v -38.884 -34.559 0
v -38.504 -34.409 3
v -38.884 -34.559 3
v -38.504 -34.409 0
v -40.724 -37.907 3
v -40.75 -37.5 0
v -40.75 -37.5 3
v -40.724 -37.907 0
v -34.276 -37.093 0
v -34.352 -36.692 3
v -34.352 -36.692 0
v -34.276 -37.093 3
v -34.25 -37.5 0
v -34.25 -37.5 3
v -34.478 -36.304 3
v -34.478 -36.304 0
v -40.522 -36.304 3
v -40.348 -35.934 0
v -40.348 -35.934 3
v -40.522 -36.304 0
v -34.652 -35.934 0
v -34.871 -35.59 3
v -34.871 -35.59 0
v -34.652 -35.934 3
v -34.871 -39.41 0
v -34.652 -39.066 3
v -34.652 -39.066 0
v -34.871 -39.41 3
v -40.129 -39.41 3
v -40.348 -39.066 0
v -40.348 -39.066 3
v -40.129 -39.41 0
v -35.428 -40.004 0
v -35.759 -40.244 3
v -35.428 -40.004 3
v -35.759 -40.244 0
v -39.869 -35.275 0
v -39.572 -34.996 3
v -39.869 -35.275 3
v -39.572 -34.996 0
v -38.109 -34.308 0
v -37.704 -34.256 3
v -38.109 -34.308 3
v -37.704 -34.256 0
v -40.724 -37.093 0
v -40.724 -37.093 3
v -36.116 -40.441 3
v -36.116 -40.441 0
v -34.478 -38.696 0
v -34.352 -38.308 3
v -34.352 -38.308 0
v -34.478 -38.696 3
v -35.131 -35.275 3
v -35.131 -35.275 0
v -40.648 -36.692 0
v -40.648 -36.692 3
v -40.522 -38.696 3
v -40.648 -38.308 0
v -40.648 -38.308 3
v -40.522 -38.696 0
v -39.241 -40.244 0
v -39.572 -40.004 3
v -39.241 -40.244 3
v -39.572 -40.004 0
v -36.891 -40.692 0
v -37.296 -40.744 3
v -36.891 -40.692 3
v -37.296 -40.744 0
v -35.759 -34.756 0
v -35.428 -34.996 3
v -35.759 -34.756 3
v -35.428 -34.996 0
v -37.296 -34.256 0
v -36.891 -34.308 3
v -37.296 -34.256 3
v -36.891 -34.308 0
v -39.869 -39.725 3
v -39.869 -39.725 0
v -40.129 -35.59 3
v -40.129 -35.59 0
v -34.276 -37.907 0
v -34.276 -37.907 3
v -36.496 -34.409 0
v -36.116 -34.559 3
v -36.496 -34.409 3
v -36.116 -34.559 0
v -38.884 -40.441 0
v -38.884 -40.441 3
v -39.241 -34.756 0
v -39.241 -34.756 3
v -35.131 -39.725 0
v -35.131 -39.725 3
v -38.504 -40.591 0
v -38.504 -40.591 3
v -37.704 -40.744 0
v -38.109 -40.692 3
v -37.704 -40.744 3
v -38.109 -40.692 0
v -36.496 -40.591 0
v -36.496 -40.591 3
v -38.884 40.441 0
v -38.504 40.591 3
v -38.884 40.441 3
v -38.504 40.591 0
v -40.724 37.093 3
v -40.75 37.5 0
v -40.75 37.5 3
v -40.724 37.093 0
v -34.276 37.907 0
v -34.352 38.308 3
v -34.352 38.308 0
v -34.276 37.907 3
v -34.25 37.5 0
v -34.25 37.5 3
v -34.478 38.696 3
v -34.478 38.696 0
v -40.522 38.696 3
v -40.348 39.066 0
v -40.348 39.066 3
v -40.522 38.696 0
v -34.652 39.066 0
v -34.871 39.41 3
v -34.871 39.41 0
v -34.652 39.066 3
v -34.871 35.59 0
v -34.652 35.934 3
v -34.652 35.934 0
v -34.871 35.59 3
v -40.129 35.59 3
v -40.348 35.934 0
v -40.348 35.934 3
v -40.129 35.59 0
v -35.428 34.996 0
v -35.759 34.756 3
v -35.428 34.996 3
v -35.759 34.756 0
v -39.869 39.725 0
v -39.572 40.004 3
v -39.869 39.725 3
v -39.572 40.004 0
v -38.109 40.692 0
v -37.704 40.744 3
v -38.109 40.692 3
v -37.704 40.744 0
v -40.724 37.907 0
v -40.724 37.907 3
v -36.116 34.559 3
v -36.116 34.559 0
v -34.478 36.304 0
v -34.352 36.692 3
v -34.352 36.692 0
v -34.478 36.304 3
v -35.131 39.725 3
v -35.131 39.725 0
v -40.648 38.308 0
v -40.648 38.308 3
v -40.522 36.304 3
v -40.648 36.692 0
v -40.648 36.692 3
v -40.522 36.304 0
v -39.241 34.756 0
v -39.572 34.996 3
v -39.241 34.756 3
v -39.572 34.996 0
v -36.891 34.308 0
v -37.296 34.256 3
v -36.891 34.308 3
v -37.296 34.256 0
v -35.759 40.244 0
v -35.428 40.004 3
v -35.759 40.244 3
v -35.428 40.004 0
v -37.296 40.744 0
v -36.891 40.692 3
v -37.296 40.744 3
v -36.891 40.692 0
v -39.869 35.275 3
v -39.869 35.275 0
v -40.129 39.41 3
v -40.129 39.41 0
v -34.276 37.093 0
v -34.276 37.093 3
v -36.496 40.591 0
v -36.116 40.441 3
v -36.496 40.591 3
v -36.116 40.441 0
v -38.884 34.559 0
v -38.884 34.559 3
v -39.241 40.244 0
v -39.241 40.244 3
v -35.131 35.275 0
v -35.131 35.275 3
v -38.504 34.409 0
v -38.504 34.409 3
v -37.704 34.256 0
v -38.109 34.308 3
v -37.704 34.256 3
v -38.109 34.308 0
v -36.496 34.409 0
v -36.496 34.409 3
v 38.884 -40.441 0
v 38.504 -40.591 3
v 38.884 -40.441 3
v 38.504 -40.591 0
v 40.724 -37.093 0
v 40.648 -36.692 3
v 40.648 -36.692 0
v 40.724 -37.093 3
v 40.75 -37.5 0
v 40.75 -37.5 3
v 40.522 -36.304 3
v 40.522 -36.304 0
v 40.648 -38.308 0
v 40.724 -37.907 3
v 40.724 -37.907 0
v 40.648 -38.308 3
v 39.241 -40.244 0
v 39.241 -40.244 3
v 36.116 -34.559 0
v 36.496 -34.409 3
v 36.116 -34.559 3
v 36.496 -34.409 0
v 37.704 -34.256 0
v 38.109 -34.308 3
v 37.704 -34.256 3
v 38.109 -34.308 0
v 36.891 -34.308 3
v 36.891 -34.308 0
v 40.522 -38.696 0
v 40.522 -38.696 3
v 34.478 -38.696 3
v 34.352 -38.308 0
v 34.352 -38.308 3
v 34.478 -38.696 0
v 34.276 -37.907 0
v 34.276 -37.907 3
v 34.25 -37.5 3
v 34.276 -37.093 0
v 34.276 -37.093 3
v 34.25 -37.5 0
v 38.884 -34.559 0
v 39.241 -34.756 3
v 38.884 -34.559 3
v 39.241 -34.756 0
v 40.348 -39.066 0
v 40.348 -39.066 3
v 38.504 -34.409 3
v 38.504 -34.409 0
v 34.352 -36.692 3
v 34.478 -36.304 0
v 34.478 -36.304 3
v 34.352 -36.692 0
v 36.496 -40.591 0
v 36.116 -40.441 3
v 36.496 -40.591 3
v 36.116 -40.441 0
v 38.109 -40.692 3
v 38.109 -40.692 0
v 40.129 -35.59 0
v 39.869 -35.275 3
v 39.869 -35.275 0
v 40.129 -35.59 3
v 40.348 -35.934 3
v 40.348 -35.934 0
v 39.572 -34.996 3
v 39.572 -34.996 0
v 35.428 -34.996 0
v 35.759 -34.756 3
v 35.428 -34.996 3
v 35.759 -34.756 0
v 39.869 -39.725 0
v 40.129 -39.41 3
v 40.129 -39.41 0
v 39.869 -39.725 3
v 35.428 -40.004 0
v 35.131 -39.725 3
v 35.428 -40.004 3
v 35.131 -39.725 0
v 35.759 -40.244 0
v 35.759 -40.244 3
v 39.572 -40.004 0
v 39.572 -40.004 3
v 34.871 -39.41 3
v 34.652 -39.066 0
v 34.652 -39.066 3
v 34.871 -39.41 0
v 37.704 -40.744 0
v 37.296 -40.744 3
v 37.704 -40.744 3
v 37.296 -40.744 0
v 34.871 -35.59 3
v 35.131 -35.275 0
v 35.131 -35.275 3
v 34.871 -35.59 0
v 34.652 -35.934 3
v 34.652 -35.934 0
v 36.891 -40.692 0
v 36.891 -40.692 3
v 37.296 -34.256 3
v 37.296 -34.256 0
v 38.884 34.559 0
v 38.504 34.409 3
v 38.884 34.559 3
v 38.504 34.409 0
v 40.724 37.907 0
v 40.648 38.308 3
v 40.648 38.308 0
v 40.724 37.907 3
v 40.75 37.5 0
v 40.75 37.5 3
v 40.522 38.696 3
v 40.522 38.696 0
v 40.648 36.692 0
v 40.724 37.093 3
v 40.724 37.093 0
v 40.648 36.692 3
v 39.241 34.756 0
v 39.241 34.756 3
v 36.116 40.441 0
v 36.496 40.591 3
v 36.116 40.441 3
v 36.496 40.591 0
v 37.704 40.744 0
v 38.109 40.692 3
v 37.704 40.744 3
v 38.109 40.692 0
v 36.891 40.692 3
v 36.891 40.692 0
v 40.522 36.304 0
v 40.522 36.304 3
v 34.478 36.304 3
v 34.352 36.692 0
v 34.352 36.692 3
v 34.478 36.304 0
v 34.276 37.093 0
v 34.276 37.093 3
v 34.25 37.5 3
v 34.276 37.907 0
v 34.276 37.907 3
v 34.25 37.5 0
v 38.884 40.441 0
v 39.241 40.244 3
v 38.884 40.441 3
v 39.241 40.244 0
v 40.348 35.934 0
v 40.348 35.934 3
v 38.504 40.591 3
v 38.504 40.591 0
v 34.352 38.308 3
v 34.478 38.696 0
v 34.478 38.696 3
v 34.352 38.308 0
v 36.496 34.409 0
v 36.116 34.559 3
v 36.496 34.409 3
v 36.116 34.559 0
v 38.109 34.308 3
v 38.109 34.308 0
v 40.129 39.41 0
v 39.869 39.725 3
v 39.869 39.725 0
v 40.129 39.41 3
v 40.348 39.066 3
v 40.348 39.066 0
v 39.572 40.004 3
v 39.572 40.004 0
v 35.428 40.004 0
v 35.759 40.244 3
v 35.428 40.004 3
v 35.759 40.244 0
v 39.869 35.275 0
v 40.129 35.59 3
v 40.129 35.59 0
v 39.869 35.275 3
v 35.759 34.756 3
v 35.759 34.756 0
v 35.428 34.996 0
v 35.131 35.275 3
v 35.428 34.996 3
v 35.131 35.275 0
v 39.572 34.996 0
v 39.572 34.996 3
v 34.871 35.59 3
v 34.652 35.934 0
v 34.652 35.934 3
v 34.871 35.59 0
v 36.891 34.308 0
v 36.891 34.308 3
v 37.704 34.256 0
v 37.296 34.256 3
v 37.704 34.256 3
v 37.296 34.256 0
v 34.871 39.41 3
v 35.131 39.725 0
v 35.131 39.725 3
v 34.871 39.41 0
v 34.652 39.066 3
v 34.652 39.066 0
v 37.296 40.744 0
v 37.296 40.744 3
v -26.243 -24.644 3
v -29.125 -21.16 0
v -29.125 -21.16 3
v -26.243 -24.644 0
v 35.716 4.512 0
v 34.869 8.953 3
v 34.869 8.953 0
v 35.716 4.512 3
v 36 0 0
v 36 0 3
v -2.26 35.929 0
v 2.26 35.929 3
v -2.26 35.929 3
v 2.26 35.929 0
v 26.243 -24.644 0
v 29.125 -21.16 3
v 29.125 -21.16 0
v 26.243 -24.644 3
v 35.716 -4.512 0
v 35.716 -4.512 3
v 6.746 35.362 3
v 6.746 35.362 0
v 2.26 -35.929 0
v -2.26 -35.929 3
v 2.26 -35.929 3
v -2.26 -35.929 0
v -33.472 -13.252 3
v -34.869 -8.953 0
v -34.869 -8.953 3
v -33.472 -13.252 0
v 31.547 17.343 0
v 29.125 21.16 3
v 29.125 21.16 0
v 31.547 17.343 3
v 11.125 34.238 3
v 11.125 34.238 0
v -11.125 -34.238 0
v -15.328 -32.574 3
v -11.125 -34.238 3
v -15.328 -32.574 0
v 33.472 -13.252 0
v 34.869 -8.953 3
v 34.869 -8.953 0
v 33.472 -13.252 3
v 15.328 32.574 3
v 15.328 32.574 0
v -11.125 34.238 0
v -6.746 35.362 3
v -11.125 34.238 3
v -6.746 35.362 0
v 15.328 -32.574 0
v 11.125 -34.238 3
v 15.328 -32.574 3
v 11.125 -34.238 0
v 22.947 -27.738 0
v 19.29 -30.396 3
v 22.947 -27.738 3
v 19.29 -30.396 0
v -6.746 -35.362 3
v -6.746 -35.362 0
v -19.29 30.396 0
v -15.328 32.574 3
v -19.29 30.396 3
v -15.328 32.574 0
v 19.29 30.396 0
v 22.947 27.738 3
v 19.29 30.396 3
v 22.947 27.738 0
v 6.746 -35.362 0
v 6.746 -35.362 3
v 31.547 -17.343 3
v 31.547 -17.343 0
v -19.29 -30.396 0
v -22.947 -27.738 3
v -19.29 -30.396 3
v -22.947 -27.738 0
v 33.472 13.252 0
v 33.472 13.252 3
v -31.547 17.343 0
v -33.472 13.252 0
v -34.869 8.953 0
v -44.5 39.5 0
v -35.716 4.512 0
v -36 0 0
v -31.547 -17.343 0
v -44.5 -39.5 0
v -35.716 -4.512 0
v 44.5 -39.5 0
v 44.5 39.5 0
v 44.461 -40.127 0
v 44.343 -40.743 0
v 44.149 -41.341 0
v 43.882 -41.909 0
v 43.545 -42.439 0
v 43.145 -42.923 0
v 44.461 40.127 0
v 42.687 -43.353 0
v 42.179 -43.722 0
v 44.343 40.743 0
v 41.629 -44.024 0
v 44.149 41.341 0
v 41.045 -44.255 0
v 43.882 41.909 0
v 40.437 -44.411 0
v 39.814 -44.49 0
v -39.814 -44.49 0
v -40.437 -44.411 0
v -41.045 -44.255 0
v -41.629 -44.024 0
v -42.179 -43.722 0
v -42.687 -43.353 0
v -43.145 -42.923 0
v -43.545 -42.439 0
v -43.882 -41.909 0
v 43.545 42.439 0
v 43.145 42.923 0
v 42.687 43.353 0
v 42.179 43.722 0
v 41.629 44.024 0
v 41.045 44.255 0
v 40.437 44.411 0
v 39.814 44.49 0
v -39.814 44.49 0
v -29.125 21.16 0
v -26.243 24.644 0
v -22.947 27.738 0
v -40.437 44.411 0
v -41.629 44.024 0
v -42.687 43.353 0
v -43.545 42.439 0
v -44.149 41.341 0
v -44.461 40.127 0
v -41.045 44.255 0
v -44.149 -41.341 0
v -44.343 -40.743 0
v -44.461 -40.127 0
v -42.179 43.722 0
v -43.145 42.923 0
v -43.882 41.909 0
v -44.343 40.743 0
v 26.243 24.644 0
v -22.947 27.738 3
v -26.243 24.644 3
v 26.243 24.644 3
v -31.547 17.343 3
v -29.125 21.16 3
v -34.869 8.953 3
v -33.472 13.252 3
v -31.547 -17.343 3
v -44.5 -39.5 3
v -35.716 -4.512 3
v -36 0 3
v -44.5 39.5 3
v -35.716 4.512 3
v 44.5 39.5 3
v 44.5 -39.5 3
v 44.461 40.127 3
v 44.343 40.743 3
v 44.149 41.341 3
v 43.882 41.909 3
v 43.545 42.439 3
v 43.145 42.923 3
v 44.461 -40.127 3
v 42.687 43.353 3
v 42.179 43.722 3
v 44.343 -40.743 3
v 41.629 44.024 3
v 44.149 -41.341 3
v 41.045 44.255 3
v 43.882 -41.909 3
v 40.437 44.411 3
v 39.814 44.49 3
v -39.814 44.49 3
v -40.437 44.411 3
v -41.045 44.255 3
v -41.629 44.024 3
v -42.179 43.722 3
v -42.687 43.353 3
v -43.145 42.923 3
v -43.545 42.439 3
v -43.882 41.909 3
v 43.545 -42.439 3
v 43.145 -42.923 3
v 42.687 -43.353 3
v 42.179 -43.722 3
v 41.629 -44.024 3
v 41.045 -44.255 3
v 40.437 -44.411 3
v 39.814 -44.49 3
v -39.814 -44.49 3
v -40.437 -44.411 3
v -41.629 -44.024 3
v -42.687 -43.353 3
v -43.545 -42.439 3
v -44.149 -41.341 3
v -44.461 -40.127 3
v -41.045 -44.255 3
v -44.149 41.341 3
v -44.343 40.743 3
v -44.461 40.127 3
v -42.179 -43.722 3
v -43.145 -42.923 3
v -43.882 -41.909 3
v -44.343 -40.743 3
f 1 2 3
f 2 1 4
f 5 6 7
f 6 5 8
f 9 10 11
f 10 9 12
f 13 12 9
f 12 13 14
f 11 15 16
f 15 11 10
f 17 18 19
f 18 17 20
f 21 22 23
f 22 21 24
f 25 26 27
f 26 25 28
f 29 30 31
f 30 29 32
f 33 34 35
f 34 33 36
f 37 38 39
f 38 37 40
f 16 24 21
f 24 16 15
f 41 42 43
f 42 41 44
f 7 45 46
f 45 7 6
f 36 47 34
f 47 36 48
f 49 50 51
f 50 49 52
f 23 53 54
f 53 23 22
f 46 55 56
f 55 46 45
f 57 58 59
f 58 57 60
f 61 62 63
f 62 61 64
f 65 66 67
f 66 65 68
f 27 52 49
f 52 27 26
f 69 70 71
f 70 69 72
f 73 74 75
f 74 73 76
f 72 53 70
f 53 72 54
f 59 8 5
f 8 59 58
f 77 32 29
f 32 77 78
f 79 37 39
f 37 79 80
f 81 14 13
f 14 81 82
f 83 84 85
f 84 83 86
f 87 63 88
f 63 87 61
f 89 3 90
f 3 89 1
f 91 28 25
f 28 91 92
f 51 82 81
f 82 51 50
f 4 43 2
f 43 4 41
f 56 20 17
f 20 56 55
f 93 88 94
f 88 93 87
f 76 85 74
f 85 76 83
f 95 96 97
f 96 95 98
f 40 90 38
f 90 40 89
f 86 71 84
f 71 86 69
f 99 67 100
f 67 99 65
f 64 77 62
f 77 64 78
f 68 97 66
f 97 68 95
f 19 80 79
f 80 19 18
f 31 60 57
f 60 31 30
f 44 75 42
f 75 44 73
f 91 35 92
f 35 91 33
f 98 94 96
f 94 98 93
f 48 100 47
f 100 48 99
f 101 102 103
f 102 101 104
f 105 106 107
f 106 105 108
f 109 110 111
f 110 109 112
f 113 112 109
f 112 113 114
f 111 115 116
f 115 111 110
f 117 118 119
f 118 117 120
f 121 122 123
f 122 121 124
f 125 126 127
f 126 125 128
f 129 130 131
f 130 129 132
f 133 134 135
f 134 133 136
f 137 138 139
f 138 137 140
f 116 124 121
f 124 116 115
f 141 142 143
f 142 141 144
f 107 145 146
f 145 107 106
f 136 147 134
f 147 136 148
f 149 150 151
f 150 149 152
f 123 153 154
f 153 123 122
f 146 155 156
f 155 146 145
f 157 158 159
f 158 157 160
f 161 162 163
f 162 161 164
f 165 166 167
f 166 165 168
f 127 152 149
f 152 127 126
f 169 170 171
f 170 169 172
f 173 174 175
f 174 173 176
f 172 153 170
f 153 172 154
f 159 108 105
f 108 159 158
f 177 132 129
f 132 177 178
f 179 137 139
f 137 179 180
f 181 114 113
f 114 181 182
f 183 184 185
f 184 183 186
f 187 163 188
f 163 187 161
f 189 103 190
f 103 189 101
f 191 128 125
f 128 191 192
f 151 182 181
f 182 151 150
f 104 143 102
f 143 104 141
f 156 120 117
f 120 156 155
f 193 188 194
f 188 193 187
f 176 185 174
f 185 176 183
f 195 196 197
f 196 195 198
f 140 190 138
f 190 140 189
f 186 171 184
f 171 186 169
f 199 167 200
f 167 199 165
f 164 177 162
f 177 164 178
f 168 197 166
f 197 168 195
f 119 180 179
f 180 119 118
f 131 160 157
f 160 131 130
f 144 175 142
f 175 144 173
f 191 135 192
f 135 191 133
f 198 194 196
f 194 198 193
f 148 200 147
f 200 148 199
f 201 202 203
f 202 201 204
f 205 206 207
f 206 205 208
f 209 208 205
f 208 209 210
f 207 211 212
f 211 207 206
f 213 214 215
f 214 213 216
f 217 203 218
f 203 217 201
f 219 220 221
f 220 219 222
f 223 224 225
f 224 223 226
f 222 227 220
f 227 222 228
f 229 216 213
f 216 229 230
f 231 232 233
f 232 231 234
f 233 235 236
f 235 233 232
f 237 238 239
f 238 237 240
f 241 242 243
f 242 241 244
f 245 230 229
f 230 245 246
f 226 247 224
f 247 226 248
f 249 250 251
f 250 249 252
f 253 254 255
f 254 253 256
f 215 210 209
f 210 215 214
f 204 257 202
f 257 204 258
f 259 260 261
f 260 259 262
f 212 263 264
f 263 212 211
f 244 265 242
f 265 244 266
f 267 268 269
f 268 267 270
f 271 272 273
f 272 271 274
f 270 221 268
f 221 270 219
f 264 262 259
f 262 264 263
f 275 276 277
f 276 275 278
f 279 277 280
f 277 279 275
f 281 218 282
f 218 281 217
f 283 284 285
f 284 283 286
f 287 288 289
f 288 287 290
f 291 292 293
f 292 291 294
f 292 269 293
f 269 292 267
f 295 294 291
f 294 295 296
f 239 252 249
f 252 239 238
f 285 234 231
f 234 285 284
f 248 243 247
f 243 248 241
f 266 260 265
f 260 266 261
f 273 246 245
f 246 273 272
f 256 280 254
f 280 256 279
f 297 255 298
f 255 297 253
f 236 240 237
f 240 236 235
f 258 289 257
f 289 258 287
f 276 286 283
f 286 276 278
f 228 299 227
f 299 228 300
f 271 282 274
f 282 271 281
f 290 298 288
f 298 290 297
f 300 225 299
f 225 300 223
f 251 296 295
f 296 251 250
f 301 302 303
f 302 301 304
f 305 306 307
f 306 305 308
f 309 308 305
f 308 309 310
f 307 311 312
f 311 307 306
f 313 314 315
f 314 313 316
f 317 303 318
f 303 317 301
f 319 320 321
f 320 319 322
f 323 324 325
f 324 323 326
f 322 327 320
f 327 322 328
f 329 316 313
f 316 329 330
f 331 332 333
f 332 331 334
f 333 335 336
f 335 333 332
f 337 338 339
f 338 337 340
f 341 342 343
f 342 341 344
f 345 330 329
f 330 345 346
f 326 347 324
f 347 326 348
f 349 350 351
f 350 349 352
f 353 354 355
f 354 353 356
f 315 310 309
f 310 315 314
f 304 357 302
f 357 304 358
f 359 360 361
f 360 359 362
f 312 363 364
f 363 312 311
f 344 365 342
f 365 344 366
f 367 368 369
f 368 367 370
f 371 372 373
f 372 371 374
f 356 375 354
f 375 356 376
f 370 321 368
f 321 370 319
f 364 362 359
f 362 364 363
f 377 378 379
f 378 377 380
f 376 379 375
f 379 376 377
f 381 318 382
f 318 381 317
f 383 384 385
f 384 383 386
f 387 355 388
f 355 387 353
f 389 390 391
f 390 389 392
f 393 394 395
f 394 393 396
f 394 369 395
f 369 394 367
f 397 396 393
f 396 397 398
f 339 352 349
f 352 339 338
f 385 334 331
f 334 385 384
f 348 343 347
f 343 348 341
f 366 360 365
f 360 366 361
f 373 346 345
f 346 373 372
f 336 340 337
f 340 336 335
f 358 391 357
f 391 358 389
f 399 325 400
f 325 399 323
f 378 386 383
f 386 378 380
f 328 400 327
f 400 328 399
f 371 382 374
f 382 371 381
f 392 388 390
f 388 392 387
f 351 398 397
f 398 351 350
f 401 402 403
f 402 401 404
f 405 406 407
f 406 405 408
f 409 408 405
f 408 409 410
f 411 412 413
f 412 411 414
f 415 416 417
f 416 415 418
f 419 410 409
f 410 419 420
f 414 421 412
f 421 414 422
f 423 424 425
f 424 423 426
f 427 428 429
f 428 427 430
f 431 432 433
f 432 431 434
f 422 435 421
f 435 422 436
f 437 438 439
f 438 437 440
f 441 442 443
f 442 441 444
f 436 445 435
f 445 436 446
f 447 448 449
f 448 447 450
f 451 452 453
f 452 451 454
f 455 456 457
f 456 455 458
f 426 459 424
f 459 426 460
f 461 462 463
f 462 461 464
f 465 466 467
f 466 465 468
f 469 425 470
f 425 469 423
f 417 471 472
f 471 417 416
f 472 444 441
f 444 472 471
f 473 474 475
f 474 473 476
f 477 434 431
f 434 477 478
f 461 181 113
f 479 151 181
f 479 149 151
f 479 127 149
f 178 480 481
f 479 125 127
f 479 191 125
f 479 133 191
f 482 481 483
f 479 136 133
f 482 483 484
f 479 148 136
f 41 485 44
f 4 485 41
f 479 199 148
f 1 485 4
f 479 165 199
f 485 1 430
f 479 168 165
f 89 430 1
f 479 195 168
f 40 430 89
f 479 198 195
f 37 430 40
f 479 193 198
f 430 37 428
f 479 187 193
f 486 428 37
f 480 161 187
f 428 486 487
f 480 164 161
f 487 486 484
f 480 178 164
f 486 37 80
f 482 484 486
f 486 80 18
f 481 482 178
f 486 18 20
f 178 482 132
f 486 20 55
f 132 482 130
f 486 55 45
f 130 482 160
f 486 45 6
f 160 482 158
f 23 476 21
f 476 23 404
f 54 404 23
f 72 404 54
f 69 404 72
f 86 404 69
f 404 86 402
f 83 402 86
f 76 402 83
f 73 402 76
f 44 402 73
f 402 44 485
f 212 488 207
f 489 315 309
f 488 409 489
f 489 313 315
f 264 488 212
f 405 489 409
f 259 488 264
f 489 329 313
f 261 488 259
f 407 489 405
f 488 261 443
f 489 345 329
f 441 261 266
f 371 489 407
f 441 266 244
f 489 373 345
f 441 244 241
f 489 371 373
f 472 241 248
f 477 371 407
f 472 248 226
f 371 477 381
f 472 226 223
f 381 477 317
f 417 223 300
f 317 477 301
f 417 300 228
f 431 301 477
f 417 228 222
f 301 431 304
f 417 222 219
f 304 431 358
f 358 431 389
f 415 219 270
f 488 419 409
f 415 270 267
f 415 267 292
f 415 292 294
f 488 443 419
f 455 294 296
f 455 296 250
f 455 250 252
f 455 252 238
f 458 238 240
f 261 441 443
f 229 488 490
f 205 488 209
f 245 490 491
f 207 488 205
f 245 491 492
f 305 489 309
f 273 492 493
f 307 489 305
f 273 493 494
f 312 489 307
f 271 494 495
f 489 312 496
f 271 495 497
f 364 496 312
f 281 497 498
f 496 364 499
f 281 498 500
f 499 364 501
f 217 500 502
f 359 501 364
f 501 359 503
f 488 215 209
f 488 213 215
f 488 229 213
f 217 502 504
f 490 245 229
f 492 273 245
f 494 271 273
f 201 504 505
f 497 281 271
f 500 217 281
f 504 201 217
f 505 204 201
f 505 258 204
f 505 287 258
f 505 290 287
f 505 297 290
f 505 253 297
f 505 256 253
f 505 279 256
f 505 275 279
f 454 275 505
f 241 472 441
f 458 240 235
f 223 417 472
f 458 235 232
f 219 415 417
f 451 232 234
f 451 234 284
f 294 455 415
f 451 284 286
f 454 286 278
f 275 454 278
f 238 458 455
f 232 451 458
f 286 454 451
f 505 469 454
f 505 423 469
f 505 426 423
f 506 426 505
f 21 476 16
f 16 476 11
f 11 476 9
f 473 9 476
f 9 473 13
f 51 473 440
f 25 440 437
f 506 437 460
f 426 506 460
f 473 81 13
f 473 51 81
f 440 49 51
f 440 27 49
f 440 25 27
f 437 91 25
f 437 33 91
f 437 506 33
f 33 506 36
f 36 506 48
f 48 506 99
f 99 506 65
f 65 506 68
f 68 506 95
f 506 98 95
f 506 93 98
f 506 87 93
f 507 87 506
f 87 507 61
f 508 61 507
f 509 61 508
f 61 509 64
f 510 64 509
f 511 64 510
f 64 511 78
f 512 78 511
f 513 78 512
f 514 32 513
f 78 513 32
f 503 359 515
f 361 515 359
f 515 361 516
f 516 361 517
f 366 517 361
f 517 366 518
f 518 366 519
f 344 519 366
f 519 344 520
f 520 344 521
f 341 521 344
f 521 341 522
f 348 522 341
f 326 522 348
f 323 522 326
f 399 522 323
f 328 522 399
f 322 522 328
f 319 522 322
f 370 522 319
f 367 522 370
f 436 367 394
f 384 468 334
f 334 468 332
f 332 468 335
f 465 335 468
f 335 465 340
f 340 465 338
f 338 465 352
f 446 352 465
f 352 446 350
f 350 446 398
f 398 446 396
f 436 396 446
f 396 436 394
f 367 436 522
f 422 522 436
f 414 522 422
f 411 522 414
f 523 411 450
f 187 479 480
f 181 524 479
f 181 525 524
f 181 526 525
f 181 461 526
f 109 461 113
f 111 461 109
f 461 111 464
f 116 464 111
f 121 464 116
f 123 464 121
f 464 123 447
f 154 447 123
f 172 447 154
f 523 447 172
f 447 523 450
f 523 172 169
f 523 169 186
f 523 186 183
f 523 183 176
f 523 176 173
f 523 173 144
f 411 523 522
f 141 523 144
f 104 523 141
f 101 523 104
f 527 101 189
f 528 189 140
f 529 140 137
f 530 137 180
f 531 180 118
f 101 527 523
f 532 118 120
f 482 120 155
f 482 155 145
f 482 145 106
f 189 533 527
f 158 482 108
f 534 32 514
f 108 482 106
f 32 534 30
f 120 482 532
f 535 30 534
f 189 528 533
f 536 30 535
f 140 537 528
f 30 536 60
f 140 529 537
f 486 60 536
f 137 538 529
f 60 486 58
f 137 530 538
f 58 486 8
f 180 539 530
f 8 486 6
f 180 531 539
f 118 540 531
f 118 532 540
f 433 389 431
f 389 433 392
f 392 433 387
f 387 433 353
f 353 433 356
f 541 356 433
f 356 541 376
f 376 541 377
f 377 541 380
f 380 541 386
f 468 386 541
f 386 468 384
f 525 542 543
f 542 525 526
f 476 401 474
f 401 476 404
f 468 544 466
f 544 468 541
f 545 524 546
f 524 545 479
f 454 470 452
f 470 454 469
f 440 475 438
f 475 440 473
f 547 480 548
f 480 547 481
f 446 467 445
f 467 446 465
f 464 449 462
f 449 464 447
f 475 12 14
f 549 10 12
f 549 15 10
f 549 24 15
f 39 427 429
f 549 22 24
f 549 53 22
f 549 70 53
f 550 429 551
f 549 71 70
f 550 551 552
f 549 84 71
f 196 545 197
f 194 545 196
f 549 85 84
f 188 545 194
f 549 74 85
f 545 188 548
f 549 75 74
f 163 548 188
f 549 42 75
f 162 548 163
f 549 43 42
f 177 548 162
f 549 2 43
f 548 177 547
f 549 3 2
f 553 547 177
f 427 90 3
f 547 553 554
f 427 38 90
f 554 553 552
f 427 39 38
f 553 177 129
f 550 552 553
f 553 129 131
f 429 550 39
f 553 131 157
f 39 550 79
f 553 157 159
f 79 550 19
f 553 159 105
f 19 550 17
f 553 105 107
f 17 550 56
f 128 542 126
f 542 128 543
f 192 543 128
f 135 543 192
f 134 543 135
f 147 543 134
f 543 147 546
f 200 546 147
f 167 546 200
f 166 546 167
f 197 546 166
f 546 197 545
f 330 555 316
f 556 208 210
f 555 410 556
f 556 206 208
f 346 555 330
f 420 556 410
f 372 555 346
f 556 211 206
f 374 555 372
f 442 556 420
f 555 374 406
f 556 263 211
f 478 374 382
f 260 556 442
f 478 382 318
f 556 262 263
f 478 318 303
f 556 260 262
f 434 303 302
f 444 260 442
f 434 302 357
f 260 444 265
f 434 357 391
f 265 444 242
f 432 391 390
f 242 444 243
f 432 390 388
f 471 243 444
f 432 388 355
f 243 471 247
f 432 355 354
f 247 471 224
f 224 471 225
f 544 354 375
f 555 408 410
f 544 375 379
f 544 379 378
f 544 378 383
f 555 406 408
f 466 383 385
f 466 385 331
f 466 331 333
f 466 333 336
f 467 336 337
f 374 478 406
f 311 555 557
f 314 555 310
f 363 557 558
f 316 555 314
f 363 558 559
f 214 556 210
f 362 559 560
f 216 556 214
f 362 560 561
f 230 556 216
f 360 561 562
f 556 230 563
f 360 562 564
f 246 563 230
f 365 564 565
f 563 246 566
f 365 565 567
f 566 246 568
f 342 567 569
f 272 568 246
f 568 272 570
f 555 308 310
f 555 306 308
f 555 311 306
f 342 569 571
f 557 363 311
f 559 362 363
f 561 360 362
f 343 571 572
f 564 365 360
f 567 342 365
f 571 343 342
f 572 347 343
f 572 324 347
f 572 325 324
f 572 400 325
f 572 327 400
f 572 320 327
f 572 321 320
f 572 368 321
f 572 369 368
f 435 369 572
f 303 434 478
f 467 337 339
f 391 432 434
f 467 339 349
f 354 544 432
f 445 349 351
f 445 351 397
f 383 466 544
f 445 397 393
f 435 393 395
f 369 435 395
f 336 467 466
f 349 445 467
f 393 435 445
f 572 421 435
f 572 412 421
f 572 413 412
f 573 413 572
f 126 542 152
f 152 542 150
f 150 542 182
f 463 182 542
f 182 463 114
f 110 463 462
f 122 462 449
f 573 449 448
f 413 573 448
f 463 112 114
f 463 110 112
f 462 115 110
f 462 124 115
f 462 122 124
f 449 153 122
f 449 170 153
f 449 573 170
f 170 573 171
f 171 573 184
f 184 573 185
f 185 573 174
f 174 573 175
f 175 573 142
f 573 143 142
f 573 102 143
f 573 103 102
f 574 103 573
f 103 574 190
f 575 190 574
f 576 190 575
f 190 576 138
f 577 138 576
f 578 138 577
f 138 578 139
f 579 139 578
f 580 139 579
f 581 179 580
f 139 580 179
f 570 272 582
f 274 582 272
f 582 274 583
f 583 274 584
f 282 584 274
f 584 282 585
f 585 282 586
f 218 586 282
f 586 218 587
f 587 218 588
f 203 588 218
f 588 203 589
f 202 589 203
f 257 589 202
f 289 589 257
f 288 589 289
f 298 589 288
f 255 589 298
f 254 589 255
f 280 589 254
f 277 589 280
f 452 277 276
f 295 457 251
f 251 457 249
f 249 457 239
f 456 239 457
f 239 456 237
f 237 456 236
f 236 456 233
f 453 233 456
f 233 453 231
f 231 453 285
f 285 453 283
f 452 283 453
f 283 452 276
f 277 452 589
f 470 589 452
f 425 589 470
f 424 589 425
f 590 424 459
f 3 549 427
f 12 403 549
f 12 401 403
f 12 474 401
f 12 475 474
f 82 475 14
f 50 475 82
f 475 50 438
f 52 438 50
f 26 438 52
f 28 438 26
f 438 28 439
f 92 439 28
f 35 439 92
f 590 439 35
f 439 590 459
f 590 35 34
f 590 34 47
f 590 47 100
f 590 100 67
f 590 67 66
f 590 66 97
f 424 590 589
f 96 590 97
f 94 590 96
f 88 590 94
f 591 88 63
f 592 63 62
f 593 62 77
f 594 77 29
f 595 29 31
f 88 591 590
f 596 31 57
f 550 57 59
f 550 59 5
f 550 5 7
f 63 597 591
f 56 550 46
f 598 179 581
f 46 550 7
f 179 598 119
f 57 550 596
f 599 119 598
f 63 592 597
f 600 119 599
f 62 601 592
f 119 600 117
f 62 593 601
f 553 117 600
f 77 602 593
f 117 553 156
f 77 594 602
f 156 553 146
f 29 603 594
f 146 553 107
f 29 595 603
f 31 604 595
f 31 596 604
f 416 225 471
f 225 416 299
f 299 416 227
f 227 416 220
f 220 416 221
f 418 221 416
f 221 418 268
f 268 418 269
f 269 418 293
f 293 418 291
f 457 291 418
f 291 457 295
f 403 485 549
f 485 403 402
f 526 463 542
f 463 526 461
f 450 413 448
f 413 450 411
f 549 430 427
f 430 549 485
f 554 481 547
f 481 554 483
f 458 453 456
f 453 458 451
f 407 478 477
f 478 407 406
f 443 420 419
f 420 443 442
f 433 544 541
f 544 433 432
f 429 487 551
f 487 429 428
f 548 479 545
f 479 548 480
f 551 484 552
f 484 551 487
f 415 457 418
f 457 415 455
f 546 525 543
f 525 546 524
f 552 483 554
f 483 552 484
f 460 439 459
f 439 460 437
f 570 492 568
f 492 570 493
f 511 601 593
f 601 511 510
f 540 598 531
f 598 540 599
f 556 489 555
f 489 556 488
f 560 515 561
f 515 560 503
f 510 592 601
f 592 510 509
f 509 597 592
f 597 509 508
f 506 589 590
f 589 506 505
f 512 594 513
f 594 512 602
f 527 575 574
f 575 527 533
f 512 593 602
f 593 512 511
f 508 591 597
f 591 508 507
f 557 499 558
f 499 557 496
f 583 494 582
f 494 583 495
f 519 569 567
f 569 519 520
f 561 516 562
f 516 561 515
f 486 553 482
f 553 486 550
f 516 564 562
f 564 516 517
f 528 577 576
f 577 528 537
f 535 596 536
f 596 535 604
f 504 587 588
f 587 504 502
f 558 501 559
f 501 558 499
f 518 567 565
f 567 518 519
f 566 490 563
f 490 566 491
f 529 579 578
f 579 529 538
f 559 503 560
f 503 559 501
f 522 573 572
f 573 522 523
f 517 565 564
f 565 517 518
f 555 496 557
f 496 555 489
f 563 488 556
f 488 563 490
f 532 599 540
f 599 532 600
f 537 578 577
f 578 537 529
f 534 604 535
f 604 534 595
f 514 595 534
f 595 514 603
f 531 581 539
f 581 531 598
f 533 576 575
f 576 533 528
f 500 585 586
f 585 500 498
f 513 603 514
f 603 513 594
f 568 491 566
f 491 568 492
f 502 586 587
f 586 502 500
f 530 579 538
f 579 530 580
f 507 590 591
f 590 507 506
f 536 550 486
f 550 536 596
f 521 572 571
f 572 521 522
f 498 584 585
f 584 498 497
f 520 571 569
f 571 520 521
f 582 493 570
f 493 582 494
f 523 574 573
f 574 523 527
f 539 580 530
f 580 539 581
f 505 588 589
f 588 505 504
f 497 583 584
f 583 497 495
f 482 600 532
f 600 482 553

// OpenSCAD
$fn = 50;

difference() {
	union() {
		hull() {
			translate(v = [-39.5, 39.5, 0]) {
				cylinder(h = 3, r = 5);
			}
			translate(v = [39.5, 39.5, 0]) {
				cylinder(h = 3, r = 5);
			}
			translate(v = [-39.5, -39.5, 0]) {
				cylinder(h = 3, r = 5);
			}
			translate(v = [39.5, -39.5, 0]) {
				cylinder(h = 3, r = 5);
			}
		}
	}
	union() {
		translate(v = [-37.5, -37.5, -100.0]) {
			cylinder(h = 200, r = 3.25);
		}
		translate(v = [-37.5, 37.5, -100.0]) {
			cylinder(h = 200, r = 3.25);
		}
		translate(v = [37.5, -37.5, -100.0]) {
			cylinder(h = 200, r = 3.25);
		}
		translate(v = [37.5, 37.5, -100.0]) {
			cylinder(h = 200, r = 3.25);
		}
		translate(v = [-37.5, -37.5, -100.0]) {
			cylinder(h = 200, r = 1.8);
		}
		translate(v = [-37.5, 37.5, -100.0]) {
			cylinder(h = 200, r = 1.8);
		}
		translate(v = [37.5, -37.5, -100.0]) {
			cylinder(h = 200, r = 1.8);
		}
		translate(v = [37.5, 37.5, -100.0]) {
			cylinder(h = 200, r = 1.8);
		}
		cylinder(h = 3, r = 36.0);
	}
}
